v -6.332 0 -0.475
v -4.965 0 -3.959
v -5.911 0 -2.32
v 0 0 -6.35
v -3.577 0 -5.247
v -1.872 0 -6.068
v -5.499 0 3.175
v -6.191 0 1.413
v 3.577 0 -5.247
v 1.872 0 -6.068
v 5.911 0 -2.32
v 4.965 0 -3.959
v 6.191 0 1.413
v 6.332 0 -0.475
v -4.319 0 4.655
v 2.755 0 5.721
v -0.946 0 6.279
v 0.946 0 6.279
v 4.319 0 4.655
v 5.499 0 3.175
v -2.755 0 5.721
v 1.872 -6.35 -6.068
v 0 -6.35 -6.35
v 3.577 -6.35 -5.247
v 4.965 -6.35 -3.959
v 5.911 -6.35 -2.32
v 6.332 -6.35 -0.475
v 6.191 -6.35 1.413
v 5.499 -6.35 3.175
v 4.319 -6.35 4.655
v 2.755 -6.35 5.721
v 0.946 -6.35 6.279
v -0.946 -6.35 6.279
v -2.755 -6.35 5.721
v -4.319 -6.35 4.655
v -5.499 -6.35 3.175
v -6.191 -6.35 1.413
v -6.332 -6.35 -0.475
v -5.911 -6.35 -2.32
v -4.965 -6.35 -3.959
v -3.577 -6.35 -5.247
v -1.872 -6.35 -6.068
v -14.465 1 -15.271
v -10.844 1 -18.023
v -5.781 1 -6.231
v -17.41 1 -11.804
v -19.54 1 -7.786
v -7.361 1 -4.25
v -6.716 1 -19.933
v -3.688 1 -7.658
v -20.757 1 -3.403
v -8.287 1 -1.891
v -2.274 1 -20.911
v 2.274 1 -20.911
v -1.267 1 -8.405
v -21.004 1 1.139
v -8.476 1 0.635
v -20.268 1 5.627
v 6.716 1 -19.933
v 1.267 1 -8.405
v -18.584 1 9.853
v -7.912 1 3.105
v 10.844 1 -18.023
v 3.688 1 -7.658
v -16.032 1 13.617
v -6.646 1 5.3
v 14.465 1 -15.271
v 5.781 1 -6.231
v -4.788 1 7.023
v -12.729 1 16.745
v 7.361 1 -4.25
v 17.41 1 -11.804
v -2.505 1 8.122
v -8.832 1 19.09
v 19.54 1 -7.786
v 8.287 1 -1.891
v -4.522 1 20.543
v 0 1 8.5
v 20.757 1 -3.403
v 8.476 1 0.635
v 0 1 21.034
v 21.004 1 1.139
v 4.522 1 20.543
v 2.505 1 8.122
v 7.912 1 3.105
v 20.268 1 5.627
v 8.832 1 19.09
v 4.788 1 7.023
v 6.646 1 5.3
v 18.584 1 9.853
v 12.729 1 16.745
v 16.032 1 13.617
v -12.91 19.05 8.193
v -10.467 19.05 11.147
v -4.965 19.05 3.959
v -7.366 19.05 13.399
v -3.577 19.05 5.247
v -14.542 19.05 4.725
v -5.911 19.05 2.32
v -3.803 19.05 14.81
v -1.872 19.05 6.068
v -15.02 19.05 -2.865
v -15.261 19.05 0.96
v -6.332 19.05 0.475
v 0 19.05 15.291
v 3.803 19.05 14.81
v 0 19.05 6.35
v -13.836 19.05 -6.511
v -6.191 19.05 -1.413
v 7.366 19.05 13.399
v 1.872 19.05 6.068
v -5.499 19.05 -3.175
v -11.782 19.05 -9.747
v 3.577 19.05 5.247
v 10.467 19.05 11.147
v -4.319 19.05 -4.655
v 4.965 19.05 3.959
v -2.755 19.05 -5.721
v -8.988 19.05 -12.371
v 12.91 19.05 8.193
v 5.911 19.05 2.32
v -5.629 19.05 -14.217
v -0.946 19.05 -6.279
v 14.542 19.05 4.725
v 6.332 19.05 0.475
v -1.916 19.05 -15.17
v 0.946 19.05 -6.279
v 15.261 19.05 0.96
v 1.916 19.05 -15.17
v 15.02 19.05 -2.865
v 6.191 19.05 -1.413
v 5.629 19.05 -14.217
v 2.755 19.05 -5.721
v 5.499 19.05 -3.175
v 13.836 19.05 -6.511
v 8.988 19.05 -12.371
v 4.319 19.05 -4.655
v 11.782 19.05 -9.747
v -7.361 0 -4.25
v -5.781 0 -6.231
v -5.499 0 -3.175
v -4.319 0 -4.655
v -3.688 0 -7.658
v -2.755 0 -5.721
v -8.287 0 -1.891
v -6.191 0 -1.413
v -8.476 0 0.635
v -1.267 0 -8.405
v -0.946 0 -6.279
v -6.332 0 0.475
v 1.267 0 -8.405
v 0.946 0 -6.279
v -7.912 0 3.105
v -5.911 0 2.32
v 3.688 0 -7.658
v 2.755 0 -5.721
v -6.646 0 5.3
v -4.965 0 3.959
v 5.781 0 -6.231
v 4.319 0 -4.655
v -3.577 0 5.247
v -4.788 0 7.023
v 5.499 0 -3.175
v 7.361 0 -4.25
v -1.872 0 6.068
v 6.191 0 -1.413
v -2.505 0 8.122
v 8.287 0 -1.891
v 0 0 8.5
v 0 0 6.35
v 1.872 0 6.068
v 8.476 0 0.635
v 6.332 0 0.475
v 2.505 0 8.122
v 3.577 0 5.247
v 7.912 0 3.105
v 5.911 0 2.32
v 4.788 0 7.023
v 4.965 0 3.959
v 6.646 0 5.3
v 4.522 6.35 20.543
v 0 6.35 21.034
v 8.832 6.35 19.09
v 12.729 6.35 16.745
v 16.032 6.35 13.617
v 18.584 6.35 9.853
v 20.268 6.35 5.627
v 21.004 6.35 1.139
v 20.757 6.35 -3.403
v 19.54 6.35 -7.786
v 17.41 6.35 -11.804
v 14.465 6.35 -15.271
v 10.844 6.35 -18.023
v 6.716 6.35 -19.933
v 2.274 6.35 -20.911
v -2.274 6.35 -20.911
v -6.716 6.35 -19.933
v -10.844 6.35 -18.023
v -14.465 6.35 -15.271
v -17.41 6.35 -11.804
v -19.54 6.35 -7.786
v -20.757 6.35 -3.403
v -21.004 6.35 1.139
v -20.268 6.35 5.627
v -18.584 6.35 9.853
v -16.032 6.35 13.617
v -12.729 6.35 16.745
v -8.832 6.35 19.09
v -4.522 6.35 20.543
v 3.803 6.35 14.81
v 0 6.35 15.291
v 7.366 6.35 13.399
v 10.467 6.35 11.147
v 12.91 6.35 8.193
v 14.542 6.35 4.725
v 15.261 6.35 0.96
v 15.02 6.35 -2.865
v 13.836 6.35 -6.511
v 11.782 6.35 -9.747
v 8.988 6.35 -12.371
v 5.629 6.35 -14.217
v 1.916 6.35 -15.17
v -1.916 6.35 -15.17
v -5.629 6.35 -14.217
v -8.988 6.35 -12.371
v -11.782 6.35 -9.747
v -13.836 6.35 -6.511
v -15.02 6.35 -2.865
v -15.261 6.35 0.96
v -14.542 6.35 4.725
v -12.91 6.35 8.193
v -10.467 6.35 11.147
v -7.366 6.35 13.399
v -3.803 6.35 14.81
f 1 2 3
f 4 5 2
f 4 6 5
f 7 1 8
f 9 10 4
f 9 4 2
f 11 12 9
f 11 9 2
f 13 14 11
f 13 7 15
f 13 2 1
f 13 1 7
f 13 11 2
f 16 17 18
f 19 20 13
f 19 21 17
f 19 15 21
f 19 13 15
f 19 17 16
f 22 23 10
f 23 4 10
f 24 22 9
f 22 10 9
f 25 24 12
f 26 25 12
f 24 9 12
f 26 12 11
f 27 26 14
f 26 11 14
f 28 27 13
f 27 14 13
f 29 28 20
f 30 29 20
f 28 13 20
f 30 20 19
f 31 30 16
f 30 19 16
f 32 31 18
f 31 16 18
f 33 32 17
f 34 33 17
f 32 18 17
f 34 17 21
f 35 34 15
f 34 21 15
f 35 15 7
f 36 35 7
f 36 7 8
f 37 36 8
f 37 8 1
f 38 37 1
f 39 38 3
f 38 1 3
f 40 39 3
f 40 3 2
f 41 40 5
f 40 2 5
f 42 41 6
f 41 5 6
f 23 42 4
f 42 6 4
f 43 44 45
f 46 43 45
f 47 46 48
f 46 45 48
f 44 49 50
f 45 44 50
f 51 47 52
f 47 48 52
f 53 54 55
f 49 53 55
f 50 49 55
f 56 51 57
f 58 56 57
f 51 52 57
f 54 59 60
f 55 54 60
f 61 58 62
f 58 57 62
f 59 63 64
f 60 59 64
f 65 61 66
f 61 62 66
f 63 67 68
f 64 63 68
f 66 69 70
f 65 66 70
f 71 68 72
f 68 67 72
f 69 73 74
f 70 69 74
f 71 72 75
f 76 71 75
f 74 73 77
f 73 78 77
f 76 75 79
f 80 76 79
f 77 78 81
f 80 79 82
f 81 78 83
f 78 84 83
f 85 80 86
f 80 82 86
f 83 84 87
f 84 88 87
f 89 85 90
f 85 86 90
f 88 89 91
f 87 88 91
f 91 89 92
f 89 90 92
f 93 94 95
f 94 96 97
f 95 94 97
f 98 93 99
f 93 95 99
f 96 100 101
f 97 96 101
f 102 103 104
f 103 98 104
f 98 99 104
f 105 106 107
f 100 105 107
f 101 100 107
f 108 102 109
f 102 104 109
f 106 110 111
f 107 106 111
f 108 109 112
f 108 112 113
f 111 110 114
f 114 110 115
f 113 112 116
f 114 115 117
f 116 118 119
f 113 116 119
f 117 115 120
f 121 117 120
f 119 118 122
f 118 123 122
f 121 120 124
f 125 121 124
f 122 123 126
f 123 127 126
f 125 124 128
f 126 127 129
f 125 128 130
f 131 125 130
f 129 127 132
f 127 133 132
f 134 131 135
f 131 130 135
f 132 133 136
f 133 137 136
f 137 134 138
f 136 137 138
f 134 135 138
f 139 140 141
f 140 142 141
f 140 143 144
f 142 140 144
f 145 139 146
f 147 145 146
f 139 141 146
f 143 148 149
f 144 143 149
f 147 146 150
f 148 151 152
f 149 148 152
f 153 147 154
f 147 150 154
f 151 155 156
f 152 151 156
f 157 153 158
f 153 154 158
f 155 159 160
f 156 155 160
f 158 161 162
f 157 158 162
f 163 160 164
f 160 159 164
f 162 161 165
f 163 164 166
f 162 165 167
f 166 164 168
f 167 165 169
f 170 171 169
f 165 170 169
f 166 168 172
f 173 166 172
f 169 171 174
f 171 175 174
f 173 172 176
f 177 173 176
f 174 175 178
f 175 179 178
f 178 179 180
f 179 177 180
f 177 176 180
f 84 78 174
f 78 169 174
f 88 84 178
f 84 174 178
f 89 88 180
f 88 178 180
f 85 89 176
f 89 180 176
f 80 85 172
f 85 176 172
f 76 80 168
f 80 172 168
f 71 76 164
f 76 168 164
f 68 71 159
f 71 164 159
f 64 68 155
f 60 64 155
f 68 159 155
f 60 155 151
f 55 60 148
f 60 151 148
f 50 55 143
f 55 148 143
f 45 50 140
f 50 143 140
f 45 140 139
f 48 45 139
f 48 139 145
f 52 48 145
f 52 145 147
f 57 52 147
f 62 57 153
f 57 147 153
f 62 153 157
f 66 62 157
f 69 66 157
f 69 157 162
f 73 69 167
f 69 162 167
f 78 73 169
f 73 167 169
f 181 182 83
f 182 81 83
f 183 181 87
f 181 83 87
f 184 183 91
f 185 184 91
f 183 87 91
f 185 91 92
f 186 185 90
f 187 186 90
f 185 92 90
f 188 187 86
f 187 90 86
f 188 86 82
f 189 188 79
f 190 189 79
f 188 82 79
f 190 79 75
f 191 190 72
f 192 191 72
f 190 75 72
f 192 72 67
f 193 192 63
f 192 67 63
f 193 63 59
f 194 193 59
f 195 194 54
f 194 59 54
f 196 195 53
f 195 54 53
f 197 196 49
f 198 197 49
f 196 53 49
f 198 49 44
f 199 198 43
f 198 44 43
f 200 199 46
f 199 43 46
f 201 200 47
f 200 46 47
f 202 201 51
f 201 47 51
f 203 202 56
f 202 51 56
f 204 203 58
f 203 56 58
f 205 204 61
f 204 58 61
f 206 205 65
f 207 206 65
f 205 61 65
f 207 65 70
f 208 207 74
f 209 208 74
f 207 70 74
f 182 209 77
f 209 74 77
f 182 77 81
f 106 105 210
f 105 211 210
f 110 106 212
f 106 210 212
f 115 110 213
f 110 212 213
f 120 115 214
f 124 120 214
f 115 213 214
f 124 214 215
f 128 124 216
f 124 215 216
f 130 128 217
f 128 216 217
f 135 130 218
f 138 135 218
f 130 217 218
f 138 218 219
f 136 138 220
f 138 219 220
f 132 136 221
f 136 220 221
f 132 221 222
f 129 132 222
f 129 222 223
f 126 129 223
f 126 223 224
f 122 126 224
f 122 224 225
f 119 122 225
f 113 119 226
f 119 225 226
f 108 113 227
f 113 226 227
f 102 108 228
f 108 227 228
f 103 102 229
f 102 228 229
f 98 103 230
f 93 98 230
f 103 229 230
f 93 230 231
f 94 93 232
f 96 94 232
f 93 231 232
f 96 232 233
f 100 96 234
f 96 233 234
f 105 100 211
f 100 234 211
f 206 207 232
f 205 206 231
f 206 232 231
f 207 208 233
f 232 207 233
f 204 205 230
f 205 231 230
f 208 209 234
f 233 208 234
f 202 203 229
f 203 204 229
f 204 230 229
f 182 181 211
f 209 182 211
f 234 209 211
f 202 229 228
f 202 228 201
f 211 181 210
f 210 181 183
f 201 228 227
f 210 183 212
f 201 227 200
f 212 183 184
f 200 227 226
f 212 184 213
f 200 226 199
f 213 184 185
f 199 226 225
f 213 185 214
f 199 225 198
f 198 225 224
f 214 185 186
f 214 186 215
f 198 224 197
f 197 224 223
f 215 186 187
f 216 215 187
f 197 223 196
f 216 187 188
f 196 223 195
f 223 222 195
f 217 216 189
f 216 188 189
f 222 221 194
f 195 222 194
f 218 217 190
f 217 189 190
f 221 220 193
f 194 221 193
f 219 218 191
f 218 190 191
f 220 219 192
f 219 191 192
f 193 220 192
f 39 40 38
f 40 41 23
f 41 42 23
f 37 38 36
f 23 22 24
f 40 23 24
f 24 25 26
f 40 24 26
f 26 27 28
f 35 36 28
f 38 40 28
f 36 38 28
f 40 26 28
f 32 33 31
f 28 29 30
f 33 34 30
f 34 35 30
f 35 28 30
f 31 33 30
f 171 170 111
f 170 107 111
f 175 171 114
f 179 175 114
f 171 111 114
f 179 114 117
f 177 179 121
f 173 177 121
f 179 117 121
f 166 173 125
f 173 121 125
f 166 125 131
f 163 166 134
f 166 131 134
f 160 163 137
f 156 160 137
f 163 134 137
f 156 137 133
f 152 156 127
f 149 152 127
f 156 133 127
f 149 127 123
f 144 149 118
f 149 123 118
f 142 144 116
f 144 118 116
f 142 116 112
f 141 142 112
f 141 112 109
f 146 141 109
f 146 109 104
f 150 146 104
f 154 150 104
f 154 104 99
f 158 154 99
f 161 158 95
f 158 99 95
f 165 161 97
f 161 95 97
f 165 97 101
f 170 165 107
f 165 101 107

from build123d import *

# Parameters (mm, degrees)
SKETCH7_W = 6.35
SKETCH7_H = 6.35


with BuildPart() as part:
    # Sketch5 → Revolve2 (revolve)
    with BuildSketch(Plane(origin=(0, 0, 0), x_dir=(-1, 0, 0), z_dir=(0, 0, -1)), mode=Mode.PRIVATE) as revolve2_sk:
        Polygon((-21.034375, 1), (-8.5, 1), (-8.5, 0), (-6.35, 0), (-6.35, 19.05), (-15.2908, 19.05), (-15.2908, 6.35), (-21.034375, 6.35), align=None)
    revolve(revolve2_sk.sketch.rotate(Axis((0, 0, 0), (0, 1, 0)), 270), axis=Axis((0, 0, 0), (0, 1, 0)))


with BuildPart() as body_2:
    # Sketch7 → Revolve3 (revolve)
    with BuildSketch(Plane.XY, mode=Mode.PRIVATE) as revolve3_sk:
        with Locations((3.175, -3.175)):
            Rectangle(SKETCH7_W, SKETCH7_H)
    revolve(revolve3_sk.sketch.rotate(Axis((0, 0, 0), (0, -1, 0)), 270), axis=Axis((0, 0, 0), (0, -1, 0)))


solid = Compound([part.part, body_2.part])
